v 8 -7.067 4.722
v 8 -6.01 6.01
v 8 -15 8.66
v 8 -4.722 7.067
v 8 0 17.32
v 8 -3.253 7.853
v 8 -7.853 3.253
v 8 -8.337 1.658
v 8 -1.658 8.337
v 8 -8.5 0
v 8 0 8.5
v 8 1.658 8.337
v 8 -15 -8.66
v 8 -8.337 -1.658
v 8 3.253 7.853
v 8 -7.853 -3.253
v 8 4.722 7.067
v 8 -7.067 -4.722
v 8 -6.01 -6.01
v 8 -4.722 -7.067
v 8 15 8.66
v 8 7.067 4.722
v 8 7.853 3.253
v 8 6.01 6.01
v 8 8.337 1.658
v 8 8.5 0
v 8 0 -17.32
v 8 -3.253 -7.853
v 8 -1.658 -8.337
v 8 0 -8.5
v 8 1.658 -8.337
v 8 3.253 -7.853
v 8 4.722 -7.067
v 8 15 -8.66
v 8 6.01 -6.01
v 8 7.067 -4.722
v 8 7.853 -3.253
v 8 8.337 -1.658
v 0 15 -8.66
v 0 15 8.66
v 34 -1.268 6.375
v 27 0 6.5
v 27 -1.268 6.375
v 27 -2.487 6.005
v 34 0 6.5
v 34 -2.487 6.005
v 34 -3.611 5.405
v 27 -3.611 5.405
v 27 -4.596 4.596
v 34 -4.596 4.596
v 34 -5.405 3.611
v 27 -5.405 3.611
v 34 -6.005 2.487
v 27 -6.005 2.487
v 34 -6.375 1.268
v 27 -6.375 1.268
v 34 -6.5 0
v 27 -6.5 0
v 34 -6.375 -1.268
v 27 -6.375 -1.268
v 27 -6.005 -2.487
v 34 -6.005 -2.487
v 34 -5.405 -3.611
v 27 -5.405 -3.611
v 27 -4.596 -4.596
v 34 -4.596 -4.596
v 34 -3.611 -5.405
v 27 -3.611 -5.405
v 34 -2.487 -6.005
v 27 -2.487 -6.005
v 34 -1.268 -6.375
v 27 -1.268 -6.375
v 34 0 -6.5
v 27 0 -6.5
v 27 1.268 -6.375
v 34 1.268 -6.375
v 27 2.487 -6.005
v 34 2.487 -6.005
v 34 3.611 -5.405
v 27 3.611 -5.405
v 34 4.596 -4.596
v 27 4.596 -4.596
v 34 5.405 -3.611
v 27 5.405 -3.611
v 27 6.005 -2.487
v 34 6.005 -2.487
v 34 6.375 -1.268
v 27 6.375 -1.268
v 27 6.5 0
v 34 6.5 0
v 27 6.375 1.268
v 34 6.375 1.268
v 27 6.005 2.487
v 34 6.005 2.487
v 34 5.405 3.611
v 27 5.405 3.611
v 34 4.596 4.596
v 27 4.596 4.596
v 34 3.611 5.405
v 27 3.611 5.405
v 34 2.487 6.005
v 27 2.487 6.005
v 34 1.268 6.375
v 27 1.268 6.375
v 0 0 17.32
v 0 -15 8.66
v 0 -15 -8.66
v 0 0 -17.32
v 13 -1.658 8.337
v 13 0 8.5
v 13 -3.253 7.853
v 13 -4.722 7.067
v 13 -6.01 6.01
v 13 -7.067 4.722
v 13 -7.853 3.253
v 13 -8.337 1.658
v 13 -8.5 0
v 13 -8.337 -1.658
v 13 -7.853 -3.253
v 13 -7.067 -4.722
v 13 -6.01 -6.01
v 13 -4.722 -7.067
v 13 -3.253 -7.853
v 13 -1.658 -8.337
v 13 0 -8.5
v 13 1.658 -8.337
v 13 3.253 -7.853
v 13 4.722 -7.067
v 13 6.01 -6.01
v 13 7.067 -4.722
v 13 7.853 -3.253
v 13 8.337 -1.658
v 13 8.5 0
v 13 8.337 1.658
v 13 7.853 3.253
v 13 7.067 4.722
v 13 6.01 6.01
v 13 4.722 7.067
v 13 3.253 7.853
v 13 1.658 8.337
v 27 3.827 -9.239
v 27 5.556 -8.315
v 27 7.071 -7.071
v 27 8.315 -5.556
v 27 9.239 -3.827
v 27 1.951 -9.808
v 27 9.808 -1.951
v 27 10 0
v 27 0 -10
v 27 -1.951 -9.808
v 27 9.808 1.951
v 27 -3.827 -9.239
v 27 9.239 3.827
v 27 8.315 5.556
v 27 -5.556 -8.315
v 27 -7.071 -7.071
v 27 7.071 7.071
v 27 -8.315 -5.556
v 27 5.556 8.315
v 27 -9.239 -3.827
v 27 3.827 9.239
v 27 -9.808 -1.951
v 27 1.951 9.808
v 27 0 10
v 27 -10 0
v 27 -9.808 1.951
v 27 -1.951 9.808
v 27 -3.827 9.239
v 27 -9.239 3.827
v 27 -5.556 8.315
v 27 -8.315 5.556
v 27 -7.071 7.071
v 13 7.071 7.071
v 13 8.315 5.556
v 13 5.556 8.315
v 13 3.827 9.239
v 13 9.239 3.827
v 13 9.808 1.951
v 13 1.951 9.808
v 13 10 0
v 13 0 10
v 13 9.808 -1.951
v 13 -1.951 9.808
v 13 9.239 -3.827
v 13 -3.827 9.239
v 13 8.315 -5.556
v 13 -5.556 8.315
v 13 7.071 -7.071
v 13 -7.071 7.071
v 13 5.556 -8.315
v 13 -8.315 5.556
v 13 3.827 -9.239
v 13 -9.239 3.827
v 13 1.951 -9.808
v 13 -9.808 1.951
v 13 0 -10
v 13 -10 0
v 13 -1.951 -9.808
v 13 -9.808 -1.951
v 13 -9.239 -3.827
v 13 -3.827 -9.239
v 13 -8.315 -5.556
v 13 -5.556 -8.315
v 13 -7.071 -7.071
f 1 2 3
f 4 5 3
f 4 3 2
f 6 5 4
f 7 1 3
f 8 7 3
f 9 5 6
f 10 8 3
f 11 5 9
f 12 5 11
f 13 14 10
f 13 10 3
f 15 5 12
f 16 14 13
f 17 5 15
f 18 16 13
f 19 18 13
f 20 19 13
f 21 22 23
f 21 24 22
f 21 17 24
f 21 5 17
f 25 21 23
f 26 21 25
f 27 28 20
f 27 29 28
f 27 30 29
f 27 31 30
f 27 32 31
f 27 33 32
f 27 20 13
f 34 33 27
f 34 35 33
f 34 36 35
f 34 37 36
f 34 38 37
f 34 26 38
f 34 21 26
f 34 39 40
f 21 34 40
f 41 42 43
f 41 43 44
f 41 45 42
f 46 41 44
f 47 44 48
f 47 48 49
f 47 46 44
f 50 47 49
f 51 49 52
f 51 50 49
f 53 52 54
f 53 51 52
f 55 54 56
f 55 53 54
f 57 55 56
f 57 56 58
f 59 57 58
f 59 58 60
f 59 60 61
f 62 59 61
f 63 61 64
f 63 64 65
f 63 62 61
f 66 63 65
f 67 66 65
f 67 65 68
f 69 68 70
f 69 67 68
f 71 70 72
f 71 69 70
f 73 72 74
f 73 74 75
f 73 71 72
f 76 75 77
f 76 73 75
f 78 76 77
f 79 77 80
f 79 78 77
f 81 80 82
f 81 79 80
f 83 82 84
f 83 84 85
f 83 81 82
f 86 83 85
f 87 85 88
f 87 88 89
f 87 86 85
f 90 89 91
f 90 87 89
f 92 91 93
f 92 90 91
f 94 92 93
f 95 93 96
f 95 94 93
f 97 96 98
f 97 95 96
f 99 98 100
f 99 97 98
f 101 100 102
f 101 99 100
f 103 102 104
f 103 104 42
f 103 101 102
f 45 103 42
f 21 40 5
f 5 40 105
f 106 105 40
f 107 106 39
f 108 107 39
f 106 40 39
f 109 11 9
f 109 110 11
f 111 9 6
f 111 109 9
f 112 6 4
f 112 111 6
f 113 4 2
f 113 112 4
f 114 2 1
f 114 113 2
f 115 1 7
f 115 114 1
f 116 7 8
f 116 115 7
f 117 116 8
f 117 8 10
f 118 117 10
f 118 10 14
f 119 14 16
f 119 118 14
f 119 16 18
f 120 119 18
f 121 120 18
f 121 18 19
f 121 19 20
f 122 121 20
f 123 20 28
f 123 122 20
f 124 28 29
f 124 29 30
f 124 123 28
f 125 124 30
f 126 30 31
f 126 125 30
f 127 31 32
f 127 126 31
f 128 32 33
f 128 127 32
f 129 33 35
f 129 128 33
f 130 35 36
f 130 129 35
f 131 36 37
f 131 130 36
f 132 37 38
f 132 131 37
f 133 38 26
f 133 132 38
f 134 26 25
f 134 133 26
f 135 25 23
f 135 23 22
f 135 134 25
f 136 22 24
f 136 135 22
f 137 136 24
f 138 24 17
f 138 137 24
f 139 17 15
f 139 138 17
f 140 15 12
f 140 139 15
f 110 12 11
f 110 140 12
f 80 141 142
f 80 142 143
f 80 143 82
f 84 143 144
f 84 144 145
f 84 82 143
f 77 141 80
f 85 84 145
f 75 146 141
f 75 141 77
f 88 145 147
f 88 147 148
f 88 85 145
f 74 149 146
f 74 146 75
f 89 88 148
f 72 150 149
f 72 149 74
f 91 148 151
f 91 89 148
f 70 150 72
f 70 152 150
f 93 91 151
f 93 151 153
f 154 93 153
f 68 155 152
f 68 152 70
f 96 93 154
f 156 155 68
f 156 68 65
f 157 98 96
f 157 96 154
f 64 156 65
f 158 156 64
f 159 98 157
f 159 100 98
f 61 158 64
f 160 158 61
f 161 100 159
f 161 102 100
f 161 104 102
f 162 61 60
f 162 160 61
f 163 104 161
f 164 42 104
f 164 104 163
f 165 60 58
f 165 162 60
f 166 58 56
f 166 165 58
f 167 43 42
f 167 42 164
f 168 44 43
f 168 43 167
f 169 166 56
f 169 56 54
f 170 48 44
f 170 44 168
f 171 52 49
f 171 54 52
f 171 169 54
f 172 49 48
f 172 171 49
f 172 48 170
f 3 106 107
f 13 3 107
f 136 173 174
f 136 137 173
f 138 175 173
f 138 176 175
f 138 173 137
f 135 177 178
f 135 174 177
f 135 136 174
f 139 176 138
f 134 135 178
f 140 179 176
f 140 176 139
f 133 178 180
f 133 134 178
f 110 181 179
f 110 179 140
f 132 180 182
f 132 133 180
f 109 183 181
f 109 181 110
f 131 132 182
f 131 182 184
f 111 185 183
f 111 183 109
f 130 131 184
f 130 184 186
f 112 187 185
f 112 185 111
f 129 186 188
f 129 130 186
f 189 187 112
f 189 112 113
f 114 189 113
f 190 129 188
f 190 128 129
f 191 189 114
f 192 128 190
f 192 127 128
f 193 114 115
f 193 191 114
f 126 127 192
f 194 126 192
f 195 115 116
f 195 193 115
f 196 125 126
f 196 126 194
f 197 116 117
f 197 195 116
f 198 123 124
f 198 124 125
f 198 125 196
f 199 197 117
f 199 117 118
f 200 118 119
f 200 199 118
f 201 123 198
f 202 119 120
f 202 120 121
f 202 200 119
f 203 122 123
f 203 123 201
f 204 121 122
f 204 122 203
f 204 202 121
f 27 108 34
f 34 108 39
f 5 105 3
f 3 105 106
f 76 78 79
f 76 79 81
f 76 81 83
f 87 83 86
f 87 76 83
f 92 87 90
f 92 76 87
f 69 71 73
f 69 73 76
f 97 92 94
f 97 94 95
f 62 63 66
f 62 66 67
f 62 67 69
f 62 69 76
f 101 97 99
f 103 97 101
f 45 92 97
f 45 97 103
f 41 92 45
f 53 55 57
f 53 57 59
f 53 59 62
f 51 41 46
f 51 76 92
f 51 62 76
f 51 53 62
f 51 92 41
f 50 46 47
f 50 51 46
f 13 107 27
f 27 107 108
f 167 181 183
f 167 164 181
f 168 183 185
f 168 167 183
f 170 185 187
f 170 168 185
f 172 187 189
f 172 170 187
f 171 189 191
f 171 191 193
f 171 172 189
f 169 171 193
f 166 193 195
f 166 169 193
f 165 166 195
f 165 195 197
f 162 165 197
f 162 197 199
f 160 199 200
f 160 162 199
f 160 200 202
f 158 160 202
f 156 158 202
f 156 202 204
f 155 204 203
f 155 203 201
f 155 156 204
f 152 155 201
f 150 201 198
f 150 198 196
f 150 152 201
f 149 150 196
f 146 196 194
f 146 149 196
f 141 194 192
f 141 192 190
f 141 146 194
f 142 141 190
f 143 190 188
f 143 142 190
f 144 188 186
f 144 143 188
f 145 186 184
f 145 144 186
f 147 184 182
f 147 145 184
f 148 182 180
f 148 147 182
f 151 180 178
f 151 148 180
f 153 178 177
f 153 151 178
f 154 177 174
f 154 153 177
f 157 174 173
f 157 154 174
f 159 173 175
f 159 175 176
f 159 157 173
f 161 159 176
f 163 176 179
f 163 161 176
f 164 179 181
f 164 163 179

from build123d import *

# Parameters (mm, degrees)
F_01_HEX_AF30_DEPTH = 8


with BuildPart() as part:
    # 草图1 → 01_HEX_AF30 (new body)
    with BuildSketch(Plane(origin=(0, 0, 0), x_dir=(0, 0, -1), z_dir=(1, 0, 0))):
        Polygon((17.3205, 0), (8.66025, 14.999993006), (-8.66025, 14.999993006), (-17.3205, 0), (-8.66025, -14.999993006), (8.66025, -14.999993006), align=None)
    extrude(amount=F_01_HEX_AF30_DEPTH)

    # 草图2 → 02_BODY (revolve)
    with BuildSketch(Plane.XY, mode=Mode.PRIVATE) as f_02_body_sk:
        Polygon((8, 0), (8, 8.5), (13, 8.5), (13, 10), (27, 10), (27, 6.5), (34, 6.5), (34, 0), align=None)
    revolve(f_02_body_sk.sketch.rotate(Axis((3, 0, 0), (1, 0, 0)), 90), axis=Axis((3, 0, 0), (1, 0, 0)))


solid = part.part
